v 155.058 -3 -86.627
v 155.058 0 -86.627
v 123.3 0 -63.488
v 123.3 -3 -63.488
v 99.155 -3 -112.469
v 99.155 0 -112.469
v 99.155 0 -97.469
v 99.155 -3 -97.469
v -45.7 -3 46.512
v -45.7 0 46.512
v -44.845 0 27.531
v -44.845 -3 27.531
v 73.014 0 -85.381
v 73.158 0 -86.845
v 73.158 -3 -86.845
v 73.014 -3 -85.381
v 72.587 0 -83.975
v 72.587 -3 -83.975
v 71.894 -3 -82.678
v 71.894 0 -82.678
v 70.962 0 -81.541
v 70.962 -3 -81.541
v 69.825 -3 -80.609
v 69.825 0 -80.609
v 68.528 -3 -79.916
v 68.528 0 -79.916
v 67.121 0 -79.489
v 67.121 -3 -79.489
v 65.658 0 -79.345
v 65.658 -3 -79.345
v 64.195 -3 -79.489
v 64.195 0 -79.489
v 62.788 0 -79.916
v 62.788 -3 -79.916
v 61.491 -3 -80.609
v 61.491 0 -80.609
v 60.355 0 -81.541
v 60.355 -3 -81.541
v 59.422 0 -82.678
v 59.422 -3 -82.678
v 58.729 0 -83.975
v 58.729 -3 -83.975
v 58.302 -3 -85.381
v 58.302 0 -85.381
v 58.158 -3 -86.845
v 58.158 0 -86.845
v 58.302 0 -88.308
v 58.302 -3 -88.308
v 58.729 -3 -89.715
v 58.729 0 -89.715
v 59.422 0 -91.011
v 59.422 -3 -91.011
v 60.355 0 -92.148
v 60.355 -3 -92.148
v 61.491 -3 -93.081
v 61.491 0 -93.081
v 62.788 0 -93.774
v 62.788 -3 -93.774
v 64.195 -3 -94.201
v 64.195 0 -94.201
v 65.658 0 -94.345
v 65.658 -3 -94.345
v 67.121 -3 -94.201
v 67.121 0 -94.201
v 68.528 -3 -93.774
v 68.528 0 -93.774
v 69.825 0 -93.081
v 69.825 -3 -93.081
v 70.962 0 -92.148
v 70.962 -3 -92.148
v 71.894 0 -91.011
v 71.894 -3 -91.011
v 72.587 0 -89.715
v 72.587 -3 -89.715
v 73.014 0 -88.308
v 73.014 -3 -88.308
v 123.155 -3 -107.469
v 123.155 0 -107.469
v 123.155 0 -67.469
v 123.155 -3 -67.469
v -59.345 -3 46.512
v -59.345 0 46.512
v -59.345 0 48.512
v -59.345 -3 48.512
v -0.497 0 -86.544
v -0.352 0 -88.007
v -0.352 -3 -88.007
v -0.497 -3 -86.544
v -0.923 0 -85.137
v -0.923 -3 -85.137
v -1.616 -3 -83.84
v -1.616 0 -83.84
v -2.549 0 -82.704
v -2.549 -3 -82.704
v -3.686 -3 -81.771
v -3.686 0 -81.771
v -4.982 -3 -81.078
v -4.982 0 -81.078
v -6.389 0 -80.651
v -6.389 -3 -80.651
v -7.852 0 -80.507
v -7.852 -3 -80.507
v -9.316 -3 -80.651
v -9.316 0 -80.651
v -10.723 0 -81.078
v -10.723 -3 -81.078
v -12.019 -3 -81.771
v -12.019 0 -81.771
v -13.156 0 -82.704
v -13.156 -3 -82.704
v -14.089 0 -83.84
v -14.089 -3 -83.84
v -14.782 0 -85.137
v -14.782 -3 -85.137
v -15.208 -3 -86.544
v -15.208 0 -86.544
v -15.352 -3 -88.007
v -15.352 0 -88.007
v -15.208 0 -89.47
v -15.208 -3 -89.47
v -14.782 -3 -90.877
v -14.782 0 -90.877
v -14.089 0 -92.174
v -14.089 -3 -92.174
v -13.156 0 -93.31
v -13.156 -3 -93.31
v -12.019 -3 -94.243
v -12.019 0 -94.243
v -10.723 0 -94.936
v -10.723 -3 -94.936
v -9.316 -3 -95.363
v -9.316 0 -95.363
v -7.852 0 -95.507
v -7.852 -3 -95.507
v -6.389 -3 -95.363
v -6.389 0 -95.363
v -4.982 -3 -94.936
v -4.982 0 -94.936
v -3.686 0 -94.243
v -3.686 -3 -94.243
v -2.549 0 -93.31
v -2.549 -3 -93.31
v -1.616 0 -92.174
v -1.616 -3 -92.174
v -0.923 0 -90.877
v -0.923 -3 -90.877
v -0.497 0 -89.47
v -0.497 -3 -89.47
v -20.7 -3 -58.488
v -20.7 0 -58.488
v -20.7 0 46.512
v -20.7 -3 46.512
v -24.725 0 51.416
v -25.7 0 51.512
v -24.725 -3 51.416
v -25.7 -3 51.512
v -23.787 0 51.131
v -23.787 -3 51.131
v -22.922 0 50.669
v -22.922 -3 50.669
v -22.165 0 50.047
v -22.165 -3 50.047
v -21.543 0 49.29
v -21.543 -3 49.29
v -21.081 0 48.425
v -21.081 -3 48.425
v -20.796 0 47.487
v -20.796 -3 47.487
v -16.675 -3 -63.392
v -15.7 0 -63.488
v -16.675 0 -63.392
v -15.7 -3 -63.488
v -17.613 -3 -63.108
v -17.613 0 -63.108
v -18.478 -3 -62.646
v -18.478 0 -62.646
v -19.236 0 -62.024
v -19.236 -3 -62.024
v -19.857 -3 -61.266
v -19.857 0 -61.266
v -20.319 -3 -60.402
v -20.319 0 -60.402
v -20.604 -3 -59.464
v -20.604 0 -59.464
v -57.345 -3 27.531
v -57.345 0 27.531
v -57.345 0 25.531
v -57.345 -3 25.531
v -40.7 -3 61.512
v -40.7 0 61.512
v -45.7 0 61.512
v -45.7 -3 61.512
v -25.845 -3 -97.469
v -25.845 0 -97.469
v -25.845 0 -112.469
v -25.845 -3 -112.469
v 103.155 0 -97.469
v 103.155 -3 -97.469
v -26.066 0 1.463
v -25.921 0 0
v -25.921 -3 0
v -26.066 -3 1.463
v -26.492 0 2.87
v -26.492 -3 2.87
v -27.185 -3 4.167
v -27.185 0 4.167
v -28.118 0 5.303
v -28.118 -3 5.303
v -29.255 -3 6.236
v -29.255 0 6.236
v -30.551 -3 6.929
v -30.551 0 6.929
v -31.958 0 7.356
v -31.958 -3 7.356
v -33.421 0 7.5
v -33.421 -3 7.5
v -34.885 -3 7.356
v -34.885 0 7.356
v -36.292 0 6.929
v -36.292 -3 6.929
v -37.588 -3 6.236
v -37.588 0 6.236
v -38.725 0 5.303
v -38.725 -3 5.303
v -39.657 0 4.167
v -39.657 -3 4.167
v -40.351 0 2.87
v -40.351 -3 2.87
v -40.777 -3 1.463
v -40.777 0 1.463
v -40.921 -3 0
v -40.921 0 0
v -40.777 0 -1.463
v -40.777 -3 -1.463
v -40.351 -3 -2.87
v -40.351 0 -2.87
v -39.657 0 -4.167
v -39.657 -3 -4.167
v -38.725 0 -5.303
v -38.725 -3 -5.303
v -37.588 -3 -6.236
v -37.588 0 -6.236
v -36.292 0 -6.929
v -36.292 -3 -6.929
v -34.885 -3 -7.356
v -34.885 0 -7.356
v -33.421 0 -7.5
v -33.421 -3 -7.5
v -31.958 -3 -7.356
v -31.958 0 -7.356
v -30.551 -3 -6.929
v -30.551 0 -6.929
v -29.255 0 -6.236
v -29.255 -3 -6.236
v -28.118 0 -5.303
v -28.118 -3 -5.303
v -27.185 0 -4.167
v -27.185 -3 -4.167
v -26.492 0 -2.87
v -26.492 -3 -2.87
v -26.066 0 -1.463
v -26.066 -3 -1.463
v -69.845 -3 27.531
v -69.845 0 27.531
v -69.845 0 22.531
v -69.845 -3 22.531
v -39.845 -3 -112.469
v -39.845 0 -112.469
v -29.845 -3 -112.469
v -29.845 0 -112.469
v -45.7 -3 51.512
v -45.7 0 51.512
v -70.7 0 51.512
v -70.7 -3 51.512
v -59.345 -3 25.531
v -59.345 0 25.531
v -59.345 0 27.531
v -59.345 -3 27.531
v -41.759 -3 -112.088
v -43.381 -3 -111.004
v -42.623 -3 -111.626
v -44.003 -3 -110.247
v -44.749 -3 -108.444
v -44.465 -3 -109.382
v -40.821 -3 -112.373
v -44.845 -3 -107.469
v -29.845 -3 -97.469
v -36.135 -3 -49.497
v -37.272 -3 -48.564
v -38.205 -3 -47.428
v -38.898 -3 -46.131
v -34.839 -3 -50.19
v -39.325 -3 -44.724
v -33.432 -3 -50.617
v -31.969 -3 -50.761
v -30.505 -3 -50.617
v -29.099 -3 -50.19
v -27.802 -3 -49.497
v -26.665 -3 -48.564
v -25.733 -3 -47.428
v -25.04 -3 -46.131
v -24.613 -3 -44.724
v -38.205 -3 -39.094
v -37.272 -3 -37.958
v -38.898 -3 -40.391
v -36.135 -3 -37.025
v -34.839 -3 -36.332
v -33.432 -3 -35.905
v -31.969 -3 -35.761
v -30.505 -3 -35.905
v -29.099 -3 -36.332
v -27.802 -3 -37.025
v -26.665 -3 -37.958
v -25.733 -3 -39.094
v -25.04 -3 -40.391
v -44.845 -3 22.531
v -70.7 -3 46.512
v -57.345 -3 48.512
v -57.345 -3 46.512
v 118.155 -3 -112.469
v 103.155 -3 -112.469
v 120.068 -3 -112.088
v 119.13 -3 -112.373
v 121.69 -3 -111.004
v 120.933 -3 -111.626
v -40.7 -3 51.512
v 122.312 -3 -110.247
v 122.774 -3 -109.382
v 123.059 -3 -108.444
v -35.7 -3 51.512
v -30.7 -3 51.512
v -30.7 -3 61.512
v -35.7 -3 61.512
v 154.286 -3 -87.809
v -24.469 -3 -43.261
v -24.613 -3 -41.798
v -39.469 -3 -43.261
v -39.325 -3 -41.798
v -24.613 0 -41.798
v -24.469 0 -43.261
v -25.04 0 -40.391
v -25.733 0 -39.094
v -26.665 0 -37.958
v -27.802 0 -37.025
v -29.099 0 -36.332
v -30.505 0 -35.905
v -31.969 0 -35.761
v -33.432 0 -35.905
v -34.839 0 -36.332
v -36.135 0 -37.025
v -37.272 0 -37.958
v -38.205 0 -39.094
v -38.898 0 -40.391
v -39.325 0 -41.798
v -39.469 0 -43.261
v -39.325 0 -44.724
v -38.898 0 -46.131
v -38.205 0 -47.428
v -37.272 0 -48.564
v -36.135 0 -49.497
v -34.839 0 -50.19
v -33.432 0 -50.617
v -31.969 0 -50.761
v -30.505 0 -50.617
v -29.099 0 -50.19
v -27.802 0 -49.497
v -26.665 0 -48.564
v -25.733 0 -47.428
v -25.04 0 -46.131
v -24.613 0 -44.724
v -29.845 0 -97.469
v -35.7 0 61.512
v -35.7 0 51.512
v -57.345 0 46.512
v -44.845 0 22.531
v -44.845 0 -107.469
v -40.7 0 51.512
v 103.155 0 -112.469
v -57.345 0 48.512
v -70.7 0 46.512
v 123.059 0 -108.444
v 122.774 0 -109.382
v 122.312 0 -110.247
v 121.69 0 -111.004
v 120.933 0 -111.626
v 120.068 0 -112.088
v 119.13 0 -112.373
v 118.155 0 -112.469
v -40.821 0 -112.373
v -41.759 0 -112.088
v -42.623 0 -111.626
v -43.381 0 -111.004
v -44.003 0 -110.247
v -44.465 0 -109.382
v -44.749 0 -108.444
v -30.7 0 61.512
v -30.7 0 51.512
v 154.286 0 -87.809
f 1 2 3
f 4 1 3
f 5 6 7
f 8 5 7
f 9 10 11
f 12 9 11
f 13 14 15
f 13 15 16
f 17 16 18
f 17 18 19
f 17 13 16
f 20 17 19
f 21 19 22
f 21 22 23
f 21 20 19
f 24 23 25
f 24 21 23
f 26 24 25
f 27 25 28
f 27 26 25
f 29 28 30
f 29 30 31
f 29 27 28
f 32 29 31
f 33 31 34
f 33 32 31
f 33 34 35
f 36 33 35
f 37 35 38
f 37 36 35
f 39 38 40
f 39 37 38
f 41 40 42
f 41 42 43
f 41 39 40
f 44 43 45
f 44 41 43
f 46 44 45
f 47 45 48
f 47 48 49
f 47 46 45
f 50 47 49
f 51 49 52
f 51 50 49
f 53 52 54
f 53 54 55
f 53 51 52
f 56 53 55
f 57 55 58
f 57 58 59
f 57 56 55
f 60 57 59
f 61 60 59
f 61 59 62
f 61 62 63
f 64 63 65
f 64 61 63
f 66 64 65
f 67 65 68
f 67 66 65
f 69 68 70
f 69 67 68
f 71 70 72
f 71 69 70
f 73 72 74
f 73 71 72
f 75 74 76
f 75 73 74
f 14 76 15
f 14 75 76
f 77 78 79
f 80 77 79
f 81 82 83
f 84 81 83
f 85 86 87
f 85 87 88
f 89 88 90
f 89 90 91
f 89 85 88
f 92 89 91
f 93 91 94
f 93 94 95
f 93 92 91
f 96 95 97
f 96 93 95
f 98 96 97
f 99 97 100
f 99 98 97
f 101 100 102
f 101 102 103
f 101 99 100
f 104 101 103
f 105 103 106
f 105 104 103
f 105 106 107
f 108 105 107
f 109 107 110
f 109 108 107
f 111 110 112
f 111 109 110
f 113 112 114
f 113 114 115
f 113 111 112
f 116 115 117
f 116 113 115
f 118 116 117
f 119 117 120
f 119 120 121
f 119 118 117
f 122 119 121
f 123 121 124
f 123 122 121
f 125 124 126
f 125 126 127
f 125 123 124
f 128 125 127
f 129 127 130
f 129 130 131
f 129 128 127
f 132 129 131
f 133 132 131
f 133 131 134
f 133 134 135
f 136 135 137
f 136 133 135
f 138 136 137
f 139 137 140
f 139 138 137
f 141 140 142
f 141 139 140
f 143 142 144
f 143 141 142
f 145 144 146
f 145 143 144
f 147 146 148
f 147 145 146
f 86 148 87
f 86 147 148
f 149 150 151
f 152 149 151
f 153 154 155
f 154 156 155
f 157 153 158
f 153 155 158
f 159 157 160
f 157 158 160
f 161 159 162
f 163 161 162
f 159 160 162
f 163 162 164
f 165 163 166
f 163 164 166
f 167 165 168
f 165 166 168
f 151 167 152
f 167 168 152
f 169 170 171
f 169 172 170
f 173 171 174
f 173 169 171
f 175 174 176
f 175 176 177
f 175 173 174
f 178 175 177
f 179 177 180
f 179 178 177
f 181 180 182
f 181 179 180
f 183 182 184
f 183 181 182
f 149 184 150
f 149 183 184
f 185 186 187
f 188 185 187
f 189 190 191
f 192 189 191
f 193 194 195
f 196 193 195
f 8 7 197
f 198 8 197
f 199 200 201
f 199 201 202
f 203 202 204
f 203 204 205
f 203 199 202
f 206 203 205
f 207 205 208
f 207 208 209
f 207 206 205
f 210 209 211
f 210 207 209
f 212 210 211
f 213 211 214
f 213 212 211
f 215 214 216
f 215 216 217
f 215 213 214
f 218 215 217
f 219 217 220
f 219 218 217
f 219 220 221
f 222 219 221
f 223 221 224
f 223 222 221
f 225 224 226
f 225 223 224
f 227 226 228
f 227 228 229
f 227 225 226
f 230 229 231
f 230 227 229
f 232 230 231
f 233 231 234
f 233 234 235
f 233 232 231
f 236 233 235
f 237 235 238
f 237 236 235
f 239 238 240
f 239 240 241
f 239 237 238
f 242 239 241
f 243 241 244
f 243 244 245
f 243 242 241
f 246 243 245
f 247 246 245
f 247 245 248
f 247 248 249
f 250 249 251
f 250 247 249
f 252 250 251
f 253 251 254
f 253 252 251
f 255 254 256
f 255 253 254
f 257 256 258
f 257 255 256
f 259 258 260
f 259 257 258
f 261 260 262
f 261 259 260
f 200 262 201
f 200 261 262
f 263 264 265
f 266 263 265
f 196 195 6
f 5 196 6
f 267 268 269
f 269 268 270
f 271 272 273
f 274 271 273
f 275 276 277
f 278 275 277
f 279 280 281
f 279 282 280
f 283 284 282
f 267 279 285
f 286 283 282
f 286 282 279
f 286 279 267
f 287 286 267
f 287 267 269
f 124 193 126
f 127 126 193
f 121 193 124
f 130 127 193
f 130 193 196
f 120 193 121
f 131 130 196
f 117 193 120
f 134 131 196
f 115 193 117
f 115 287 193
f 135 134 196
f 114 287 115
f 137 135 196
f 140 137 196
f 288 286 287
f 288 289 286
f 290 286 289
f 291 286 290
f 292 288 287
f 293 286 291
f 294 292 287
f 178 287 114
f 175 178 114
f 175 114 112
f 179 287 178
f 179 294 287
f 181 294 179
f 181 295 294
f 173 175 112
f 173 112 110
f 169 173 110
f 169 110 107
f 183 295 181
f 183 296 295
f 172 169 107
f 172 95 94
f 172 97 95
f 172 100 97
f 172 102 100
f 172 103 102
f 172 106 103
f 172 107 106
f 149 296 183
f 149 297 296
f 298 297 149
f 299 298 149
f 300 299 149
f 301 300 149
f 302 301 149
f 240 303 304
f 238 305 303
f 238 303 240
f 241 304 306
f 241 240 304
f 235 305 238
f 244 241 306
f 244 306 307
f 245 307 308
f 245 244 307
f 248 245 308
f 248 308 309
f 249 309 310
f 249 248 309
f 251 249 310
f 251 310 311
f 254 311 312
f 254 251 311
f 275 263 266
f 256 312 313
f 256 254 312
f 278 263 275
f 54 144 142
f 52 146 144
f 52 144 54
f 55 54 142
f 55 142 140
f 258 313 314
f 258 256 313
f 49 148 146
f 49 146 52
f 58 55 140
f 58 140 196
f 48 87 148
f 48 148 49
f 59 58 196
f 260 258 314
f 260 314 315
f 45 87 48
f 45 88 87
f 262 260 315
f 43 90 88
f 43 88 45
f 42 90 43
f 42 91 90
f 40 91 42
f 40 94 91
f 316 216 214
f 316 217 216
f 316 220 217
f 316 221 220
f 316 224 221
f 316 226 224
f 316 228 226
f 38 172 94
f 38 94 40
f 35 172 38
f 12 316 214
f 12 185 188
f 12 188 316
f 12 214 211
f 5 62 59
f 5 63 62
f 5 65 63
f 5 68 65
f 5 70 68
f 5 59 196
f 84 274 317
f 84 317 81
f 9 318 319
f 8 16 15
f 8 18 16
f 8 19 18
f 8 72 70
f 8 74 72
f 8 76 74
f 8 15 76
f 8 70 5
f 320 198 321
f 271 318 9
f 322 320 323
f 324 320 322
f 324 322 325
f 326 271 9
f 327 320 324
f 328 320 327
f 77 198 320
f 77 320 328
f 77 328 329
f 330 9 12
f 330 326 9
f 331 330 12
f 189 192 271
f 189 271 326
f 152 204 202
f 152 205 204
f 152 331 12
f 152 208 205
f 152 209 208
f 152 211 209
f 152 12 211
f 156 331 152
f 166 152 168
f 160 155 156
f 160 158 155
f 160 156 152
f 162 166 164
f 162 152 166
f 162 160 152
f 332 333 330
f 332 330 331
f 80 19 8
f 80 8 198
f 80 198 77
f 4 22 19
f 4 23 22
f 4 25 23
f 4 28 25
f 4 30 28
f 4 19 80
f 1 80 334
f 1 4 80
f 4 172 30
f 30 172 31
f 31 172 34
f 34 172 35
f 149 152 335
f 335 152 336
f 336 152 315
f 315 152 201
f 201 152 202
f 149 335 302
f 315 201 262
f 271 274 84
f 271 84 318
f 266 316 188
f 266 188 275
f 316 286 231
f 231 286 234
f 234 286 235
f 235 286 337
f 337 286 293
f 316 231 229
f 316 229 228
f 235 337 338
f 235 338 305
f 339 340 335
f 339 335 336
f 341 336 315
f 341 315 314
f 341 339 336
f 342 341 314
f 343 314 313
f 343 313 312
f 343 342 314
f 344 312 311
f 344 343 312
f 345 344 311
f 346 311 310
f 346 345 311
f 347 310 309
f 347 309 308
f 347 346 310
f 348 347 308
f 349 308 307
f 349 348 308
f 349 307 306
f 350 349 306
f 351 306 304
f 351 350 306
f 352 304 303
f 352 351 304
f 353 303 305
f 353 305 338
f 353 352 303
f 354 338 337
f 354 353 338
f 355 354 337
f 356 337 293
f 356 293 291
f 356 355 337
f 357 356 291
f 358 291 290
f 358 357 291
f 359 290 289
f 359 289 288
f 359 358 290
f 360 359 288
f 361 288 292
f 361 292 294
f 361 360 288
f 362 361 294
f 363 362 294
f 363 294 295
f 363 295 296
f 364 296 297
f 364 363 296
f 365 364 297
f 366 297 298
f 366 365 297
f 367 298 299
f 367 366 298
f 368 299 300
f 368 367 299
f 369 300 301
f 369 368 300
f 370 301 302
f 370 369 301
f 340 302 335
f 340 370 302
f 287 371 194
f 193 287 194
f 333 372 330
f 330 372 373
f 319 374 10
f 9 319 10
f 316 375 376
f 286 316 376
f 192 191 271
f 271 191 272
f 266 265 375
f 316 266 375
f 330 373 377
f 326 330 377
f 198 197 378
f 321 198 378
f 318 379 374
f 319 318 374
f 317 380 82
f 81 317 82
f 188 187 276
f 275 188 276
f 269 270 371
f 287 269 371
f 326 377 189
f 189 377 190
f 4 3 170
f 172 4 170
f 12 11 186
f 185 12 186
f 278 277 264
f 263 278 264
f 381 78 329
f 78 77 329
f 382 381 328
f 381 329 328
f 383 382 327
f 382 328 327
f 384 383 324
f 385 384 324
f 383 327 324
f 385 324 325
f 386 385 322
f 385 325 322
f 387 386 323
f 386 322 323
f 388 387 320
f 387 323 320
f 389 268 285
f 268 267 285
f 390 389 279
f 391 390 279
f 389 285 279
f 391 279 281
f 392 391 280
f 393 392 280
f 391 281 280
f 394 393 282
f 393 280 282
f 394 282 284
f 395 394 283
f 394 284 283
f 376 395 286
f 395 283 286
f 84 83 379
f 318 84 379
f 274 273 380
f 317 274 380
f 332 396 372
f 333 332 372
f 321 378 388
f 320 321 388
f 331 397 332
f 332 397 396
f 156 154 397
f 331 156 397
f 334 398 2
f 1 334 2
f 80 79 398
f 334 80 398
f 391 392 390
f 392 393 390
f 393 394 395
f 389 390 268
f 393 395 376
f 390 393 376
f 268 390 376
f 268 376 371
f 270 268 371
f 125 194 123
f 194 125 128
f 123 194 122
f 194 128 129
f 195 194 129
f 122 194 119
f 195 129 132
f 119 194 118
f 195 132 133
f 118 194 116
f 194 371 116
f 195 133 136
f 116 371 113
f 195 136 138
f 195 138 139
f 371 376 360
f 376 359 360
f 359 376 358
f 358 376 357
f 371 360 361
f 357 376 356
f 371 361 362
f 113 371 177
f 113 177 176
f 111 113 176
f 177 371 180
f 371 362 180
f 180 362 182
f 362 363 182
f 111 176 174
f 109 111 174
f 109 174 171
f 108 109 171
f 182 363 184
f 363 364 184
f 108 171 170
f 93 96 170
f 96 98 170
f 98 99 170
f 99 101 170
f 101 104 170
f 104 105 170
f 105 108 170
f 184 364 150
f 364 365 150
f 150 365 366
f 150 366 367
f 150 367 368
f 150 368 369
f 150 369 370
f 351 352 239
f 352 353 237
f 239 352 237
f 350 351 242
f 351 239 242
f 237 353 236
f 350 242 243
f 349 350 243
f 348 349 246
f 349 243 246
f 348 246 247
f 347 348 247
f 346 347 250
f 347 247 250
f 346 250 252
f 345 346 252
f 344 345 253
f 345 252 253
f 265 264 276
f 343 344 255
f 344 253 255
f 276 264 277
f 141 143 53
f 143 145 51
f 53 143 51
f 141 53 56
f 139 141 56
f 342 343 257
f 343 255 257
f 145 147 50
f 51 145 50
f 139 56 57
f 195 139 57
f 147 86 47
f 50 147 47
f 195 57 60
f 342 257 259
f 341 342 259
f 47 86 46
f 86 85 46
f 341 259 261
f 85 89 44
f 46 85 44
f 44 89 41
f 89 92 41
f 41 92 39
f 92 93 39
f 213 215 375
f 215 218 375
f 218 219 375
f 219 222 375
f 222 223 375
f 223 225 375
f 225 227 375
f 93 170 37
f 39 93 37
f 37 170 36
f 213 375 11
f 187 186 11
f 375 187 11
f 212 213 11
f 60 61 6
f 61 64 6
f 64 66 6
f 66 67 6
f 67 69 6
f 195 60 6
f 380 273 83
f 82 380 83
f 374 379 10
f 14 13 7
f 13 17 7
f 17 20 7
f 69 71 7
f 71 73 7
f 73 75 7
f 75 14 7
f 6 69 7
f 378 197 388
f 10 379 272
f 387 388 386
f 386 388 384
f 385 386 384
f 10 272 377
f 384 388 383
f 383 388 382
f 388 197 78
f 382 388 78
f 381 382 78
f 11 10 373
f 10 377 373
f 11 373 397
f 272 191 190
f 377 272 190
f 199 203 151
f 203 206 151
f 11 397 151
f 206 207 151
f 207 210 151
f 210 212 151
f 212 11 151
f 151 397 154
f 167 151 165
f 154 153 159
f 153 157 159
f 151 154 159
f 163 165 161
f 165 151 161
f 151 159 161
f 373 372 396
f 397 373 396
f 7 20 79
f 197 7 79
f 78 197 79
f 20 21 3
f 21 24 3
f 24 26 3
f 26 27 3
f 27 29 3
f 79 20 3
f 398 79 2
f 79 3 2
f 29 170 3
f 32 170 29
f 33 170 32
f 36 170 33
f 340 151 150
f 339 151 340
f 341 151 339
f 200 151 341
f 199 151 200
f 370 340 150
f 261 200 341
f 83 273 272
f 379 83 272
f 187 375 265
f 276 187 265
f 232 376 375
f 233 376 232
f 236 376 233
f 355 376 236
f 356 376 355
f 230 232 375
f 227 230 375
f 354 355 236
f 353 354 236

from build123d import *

# Parameters (mm, degrees)
F0_R     = 7.5
F1_DEPTH = 3
F2_R     = 5
F3_R     = 5
F4_R     = 5
F5_R     = 5


# Not quite as in the source:
# - a feature of the source that left no trace in its solid (it failed there, or was rolled back) is left out


with BuildPart() as f1:
    # F0 (on Front) → F1 (new body)
    with BuildSketch(Plane.XZ):
        Polygon((-45.7000464201, 51.51183635), (-70.7000464201, 51.51183635), (-70.7000464201, 46.51183635), (-63.6224076152, 46.51183635), (-59.3452238418, 46.51183635), (-59.3452238418, 48.51183635), (-57.3452238418, 48.51183635), (-57.3452238418, 46.51183635), (-45.7000464201, 46.51183635), (-44.8452238418, 27.5310756076), (-57.3452238418, 27.5310756076), (-57.3452238418, 25.5310756076), (-59.3452238418, 25.5310756076), (-59.3452238418, 27.5310756076), (-69.8452238418, 27.5310756076), (-69.8452238418, 22.5310756076), (-44.8452238418, 22.5310756076), (-44.8452238418, -112.4689243924), (-29.8452238418, -112.4689243924), (-29.8452238418, -97.4689243924), (-25.8452238418, -97.4689243924), (-25.8452238418, -112.4689243924), (99.1547761582, -112.4689243924), (99.1547761582, -97.4689243924), (103.1547761582, -97.4689243924), (103.1547761582, -112.4689243924), (123.1547761582, -112.4689243924), (123.1547761582, -67.4689243924), (154.2856724769, -87.808891194), (155.0577331575, -86.6272304158), (123.2999535799, -63.48816365), (-20.7000464201, -63.48816365), (-20.7000464201, 51.51183635), (-30.7000464201, 51.51183635), (-30.7000464201, 61.51183635), (-35.7000464201, 61.51183635), (-35.7000464201, 51.51183635), (-40.7000464201, 51.51183635), (-40.7000464201, 61.51183635), (-45.7000464201, 61.51183635), align=None)
        with Locations((-7.8524835408, -88.0068540573)):
            Circle(F0_R, mode=Mode.SUBTRACT)
        with Locations((-31.9686569273, -43.2611815631)):
            Circle(F0_R, mode=Mode.SUBTRACT)
        with Locations((65.6582638621, -86.8446305394)):
            Circle(F0_R, mode=Mode.SUBTRACT)
        with Locations((-33.4214381874, 0)):
            Circle(F0_R, mode=Mode.SUBTRACT)
    extrude(amount=F1_DEPTH)

    # F2
    f2_edges = [f1.edges().sort_by_distance(p)[0] for p in [
        (-20.700046, -1.5, 51.511836),
    ]]
    fillet(f2_edges, radius=F2_R)

    # F3
    f3_edges = [f1.edges().sort_by_distance(p)[0] for p in [
        (123.154776, -1.5, -112.468924),
    ]]
    fillet(f3_edges, radius=F3_R)

    # F4
    f4_edges = [f1.edges().sort_by_distance(p)[0] for p in [
        (-44.845224, -1.5, -112.468924),
    ]]
    fillet(f4_edges, radius=F4_R)

    # F5
    f5_edges = [f1.edges().sort_by_distance(p)[0] for p in [
        (-20.700046, -1.5, -63.488164),
    ]]
    fillet(f5_edges, radius=F5_R)


solid = f1.part
